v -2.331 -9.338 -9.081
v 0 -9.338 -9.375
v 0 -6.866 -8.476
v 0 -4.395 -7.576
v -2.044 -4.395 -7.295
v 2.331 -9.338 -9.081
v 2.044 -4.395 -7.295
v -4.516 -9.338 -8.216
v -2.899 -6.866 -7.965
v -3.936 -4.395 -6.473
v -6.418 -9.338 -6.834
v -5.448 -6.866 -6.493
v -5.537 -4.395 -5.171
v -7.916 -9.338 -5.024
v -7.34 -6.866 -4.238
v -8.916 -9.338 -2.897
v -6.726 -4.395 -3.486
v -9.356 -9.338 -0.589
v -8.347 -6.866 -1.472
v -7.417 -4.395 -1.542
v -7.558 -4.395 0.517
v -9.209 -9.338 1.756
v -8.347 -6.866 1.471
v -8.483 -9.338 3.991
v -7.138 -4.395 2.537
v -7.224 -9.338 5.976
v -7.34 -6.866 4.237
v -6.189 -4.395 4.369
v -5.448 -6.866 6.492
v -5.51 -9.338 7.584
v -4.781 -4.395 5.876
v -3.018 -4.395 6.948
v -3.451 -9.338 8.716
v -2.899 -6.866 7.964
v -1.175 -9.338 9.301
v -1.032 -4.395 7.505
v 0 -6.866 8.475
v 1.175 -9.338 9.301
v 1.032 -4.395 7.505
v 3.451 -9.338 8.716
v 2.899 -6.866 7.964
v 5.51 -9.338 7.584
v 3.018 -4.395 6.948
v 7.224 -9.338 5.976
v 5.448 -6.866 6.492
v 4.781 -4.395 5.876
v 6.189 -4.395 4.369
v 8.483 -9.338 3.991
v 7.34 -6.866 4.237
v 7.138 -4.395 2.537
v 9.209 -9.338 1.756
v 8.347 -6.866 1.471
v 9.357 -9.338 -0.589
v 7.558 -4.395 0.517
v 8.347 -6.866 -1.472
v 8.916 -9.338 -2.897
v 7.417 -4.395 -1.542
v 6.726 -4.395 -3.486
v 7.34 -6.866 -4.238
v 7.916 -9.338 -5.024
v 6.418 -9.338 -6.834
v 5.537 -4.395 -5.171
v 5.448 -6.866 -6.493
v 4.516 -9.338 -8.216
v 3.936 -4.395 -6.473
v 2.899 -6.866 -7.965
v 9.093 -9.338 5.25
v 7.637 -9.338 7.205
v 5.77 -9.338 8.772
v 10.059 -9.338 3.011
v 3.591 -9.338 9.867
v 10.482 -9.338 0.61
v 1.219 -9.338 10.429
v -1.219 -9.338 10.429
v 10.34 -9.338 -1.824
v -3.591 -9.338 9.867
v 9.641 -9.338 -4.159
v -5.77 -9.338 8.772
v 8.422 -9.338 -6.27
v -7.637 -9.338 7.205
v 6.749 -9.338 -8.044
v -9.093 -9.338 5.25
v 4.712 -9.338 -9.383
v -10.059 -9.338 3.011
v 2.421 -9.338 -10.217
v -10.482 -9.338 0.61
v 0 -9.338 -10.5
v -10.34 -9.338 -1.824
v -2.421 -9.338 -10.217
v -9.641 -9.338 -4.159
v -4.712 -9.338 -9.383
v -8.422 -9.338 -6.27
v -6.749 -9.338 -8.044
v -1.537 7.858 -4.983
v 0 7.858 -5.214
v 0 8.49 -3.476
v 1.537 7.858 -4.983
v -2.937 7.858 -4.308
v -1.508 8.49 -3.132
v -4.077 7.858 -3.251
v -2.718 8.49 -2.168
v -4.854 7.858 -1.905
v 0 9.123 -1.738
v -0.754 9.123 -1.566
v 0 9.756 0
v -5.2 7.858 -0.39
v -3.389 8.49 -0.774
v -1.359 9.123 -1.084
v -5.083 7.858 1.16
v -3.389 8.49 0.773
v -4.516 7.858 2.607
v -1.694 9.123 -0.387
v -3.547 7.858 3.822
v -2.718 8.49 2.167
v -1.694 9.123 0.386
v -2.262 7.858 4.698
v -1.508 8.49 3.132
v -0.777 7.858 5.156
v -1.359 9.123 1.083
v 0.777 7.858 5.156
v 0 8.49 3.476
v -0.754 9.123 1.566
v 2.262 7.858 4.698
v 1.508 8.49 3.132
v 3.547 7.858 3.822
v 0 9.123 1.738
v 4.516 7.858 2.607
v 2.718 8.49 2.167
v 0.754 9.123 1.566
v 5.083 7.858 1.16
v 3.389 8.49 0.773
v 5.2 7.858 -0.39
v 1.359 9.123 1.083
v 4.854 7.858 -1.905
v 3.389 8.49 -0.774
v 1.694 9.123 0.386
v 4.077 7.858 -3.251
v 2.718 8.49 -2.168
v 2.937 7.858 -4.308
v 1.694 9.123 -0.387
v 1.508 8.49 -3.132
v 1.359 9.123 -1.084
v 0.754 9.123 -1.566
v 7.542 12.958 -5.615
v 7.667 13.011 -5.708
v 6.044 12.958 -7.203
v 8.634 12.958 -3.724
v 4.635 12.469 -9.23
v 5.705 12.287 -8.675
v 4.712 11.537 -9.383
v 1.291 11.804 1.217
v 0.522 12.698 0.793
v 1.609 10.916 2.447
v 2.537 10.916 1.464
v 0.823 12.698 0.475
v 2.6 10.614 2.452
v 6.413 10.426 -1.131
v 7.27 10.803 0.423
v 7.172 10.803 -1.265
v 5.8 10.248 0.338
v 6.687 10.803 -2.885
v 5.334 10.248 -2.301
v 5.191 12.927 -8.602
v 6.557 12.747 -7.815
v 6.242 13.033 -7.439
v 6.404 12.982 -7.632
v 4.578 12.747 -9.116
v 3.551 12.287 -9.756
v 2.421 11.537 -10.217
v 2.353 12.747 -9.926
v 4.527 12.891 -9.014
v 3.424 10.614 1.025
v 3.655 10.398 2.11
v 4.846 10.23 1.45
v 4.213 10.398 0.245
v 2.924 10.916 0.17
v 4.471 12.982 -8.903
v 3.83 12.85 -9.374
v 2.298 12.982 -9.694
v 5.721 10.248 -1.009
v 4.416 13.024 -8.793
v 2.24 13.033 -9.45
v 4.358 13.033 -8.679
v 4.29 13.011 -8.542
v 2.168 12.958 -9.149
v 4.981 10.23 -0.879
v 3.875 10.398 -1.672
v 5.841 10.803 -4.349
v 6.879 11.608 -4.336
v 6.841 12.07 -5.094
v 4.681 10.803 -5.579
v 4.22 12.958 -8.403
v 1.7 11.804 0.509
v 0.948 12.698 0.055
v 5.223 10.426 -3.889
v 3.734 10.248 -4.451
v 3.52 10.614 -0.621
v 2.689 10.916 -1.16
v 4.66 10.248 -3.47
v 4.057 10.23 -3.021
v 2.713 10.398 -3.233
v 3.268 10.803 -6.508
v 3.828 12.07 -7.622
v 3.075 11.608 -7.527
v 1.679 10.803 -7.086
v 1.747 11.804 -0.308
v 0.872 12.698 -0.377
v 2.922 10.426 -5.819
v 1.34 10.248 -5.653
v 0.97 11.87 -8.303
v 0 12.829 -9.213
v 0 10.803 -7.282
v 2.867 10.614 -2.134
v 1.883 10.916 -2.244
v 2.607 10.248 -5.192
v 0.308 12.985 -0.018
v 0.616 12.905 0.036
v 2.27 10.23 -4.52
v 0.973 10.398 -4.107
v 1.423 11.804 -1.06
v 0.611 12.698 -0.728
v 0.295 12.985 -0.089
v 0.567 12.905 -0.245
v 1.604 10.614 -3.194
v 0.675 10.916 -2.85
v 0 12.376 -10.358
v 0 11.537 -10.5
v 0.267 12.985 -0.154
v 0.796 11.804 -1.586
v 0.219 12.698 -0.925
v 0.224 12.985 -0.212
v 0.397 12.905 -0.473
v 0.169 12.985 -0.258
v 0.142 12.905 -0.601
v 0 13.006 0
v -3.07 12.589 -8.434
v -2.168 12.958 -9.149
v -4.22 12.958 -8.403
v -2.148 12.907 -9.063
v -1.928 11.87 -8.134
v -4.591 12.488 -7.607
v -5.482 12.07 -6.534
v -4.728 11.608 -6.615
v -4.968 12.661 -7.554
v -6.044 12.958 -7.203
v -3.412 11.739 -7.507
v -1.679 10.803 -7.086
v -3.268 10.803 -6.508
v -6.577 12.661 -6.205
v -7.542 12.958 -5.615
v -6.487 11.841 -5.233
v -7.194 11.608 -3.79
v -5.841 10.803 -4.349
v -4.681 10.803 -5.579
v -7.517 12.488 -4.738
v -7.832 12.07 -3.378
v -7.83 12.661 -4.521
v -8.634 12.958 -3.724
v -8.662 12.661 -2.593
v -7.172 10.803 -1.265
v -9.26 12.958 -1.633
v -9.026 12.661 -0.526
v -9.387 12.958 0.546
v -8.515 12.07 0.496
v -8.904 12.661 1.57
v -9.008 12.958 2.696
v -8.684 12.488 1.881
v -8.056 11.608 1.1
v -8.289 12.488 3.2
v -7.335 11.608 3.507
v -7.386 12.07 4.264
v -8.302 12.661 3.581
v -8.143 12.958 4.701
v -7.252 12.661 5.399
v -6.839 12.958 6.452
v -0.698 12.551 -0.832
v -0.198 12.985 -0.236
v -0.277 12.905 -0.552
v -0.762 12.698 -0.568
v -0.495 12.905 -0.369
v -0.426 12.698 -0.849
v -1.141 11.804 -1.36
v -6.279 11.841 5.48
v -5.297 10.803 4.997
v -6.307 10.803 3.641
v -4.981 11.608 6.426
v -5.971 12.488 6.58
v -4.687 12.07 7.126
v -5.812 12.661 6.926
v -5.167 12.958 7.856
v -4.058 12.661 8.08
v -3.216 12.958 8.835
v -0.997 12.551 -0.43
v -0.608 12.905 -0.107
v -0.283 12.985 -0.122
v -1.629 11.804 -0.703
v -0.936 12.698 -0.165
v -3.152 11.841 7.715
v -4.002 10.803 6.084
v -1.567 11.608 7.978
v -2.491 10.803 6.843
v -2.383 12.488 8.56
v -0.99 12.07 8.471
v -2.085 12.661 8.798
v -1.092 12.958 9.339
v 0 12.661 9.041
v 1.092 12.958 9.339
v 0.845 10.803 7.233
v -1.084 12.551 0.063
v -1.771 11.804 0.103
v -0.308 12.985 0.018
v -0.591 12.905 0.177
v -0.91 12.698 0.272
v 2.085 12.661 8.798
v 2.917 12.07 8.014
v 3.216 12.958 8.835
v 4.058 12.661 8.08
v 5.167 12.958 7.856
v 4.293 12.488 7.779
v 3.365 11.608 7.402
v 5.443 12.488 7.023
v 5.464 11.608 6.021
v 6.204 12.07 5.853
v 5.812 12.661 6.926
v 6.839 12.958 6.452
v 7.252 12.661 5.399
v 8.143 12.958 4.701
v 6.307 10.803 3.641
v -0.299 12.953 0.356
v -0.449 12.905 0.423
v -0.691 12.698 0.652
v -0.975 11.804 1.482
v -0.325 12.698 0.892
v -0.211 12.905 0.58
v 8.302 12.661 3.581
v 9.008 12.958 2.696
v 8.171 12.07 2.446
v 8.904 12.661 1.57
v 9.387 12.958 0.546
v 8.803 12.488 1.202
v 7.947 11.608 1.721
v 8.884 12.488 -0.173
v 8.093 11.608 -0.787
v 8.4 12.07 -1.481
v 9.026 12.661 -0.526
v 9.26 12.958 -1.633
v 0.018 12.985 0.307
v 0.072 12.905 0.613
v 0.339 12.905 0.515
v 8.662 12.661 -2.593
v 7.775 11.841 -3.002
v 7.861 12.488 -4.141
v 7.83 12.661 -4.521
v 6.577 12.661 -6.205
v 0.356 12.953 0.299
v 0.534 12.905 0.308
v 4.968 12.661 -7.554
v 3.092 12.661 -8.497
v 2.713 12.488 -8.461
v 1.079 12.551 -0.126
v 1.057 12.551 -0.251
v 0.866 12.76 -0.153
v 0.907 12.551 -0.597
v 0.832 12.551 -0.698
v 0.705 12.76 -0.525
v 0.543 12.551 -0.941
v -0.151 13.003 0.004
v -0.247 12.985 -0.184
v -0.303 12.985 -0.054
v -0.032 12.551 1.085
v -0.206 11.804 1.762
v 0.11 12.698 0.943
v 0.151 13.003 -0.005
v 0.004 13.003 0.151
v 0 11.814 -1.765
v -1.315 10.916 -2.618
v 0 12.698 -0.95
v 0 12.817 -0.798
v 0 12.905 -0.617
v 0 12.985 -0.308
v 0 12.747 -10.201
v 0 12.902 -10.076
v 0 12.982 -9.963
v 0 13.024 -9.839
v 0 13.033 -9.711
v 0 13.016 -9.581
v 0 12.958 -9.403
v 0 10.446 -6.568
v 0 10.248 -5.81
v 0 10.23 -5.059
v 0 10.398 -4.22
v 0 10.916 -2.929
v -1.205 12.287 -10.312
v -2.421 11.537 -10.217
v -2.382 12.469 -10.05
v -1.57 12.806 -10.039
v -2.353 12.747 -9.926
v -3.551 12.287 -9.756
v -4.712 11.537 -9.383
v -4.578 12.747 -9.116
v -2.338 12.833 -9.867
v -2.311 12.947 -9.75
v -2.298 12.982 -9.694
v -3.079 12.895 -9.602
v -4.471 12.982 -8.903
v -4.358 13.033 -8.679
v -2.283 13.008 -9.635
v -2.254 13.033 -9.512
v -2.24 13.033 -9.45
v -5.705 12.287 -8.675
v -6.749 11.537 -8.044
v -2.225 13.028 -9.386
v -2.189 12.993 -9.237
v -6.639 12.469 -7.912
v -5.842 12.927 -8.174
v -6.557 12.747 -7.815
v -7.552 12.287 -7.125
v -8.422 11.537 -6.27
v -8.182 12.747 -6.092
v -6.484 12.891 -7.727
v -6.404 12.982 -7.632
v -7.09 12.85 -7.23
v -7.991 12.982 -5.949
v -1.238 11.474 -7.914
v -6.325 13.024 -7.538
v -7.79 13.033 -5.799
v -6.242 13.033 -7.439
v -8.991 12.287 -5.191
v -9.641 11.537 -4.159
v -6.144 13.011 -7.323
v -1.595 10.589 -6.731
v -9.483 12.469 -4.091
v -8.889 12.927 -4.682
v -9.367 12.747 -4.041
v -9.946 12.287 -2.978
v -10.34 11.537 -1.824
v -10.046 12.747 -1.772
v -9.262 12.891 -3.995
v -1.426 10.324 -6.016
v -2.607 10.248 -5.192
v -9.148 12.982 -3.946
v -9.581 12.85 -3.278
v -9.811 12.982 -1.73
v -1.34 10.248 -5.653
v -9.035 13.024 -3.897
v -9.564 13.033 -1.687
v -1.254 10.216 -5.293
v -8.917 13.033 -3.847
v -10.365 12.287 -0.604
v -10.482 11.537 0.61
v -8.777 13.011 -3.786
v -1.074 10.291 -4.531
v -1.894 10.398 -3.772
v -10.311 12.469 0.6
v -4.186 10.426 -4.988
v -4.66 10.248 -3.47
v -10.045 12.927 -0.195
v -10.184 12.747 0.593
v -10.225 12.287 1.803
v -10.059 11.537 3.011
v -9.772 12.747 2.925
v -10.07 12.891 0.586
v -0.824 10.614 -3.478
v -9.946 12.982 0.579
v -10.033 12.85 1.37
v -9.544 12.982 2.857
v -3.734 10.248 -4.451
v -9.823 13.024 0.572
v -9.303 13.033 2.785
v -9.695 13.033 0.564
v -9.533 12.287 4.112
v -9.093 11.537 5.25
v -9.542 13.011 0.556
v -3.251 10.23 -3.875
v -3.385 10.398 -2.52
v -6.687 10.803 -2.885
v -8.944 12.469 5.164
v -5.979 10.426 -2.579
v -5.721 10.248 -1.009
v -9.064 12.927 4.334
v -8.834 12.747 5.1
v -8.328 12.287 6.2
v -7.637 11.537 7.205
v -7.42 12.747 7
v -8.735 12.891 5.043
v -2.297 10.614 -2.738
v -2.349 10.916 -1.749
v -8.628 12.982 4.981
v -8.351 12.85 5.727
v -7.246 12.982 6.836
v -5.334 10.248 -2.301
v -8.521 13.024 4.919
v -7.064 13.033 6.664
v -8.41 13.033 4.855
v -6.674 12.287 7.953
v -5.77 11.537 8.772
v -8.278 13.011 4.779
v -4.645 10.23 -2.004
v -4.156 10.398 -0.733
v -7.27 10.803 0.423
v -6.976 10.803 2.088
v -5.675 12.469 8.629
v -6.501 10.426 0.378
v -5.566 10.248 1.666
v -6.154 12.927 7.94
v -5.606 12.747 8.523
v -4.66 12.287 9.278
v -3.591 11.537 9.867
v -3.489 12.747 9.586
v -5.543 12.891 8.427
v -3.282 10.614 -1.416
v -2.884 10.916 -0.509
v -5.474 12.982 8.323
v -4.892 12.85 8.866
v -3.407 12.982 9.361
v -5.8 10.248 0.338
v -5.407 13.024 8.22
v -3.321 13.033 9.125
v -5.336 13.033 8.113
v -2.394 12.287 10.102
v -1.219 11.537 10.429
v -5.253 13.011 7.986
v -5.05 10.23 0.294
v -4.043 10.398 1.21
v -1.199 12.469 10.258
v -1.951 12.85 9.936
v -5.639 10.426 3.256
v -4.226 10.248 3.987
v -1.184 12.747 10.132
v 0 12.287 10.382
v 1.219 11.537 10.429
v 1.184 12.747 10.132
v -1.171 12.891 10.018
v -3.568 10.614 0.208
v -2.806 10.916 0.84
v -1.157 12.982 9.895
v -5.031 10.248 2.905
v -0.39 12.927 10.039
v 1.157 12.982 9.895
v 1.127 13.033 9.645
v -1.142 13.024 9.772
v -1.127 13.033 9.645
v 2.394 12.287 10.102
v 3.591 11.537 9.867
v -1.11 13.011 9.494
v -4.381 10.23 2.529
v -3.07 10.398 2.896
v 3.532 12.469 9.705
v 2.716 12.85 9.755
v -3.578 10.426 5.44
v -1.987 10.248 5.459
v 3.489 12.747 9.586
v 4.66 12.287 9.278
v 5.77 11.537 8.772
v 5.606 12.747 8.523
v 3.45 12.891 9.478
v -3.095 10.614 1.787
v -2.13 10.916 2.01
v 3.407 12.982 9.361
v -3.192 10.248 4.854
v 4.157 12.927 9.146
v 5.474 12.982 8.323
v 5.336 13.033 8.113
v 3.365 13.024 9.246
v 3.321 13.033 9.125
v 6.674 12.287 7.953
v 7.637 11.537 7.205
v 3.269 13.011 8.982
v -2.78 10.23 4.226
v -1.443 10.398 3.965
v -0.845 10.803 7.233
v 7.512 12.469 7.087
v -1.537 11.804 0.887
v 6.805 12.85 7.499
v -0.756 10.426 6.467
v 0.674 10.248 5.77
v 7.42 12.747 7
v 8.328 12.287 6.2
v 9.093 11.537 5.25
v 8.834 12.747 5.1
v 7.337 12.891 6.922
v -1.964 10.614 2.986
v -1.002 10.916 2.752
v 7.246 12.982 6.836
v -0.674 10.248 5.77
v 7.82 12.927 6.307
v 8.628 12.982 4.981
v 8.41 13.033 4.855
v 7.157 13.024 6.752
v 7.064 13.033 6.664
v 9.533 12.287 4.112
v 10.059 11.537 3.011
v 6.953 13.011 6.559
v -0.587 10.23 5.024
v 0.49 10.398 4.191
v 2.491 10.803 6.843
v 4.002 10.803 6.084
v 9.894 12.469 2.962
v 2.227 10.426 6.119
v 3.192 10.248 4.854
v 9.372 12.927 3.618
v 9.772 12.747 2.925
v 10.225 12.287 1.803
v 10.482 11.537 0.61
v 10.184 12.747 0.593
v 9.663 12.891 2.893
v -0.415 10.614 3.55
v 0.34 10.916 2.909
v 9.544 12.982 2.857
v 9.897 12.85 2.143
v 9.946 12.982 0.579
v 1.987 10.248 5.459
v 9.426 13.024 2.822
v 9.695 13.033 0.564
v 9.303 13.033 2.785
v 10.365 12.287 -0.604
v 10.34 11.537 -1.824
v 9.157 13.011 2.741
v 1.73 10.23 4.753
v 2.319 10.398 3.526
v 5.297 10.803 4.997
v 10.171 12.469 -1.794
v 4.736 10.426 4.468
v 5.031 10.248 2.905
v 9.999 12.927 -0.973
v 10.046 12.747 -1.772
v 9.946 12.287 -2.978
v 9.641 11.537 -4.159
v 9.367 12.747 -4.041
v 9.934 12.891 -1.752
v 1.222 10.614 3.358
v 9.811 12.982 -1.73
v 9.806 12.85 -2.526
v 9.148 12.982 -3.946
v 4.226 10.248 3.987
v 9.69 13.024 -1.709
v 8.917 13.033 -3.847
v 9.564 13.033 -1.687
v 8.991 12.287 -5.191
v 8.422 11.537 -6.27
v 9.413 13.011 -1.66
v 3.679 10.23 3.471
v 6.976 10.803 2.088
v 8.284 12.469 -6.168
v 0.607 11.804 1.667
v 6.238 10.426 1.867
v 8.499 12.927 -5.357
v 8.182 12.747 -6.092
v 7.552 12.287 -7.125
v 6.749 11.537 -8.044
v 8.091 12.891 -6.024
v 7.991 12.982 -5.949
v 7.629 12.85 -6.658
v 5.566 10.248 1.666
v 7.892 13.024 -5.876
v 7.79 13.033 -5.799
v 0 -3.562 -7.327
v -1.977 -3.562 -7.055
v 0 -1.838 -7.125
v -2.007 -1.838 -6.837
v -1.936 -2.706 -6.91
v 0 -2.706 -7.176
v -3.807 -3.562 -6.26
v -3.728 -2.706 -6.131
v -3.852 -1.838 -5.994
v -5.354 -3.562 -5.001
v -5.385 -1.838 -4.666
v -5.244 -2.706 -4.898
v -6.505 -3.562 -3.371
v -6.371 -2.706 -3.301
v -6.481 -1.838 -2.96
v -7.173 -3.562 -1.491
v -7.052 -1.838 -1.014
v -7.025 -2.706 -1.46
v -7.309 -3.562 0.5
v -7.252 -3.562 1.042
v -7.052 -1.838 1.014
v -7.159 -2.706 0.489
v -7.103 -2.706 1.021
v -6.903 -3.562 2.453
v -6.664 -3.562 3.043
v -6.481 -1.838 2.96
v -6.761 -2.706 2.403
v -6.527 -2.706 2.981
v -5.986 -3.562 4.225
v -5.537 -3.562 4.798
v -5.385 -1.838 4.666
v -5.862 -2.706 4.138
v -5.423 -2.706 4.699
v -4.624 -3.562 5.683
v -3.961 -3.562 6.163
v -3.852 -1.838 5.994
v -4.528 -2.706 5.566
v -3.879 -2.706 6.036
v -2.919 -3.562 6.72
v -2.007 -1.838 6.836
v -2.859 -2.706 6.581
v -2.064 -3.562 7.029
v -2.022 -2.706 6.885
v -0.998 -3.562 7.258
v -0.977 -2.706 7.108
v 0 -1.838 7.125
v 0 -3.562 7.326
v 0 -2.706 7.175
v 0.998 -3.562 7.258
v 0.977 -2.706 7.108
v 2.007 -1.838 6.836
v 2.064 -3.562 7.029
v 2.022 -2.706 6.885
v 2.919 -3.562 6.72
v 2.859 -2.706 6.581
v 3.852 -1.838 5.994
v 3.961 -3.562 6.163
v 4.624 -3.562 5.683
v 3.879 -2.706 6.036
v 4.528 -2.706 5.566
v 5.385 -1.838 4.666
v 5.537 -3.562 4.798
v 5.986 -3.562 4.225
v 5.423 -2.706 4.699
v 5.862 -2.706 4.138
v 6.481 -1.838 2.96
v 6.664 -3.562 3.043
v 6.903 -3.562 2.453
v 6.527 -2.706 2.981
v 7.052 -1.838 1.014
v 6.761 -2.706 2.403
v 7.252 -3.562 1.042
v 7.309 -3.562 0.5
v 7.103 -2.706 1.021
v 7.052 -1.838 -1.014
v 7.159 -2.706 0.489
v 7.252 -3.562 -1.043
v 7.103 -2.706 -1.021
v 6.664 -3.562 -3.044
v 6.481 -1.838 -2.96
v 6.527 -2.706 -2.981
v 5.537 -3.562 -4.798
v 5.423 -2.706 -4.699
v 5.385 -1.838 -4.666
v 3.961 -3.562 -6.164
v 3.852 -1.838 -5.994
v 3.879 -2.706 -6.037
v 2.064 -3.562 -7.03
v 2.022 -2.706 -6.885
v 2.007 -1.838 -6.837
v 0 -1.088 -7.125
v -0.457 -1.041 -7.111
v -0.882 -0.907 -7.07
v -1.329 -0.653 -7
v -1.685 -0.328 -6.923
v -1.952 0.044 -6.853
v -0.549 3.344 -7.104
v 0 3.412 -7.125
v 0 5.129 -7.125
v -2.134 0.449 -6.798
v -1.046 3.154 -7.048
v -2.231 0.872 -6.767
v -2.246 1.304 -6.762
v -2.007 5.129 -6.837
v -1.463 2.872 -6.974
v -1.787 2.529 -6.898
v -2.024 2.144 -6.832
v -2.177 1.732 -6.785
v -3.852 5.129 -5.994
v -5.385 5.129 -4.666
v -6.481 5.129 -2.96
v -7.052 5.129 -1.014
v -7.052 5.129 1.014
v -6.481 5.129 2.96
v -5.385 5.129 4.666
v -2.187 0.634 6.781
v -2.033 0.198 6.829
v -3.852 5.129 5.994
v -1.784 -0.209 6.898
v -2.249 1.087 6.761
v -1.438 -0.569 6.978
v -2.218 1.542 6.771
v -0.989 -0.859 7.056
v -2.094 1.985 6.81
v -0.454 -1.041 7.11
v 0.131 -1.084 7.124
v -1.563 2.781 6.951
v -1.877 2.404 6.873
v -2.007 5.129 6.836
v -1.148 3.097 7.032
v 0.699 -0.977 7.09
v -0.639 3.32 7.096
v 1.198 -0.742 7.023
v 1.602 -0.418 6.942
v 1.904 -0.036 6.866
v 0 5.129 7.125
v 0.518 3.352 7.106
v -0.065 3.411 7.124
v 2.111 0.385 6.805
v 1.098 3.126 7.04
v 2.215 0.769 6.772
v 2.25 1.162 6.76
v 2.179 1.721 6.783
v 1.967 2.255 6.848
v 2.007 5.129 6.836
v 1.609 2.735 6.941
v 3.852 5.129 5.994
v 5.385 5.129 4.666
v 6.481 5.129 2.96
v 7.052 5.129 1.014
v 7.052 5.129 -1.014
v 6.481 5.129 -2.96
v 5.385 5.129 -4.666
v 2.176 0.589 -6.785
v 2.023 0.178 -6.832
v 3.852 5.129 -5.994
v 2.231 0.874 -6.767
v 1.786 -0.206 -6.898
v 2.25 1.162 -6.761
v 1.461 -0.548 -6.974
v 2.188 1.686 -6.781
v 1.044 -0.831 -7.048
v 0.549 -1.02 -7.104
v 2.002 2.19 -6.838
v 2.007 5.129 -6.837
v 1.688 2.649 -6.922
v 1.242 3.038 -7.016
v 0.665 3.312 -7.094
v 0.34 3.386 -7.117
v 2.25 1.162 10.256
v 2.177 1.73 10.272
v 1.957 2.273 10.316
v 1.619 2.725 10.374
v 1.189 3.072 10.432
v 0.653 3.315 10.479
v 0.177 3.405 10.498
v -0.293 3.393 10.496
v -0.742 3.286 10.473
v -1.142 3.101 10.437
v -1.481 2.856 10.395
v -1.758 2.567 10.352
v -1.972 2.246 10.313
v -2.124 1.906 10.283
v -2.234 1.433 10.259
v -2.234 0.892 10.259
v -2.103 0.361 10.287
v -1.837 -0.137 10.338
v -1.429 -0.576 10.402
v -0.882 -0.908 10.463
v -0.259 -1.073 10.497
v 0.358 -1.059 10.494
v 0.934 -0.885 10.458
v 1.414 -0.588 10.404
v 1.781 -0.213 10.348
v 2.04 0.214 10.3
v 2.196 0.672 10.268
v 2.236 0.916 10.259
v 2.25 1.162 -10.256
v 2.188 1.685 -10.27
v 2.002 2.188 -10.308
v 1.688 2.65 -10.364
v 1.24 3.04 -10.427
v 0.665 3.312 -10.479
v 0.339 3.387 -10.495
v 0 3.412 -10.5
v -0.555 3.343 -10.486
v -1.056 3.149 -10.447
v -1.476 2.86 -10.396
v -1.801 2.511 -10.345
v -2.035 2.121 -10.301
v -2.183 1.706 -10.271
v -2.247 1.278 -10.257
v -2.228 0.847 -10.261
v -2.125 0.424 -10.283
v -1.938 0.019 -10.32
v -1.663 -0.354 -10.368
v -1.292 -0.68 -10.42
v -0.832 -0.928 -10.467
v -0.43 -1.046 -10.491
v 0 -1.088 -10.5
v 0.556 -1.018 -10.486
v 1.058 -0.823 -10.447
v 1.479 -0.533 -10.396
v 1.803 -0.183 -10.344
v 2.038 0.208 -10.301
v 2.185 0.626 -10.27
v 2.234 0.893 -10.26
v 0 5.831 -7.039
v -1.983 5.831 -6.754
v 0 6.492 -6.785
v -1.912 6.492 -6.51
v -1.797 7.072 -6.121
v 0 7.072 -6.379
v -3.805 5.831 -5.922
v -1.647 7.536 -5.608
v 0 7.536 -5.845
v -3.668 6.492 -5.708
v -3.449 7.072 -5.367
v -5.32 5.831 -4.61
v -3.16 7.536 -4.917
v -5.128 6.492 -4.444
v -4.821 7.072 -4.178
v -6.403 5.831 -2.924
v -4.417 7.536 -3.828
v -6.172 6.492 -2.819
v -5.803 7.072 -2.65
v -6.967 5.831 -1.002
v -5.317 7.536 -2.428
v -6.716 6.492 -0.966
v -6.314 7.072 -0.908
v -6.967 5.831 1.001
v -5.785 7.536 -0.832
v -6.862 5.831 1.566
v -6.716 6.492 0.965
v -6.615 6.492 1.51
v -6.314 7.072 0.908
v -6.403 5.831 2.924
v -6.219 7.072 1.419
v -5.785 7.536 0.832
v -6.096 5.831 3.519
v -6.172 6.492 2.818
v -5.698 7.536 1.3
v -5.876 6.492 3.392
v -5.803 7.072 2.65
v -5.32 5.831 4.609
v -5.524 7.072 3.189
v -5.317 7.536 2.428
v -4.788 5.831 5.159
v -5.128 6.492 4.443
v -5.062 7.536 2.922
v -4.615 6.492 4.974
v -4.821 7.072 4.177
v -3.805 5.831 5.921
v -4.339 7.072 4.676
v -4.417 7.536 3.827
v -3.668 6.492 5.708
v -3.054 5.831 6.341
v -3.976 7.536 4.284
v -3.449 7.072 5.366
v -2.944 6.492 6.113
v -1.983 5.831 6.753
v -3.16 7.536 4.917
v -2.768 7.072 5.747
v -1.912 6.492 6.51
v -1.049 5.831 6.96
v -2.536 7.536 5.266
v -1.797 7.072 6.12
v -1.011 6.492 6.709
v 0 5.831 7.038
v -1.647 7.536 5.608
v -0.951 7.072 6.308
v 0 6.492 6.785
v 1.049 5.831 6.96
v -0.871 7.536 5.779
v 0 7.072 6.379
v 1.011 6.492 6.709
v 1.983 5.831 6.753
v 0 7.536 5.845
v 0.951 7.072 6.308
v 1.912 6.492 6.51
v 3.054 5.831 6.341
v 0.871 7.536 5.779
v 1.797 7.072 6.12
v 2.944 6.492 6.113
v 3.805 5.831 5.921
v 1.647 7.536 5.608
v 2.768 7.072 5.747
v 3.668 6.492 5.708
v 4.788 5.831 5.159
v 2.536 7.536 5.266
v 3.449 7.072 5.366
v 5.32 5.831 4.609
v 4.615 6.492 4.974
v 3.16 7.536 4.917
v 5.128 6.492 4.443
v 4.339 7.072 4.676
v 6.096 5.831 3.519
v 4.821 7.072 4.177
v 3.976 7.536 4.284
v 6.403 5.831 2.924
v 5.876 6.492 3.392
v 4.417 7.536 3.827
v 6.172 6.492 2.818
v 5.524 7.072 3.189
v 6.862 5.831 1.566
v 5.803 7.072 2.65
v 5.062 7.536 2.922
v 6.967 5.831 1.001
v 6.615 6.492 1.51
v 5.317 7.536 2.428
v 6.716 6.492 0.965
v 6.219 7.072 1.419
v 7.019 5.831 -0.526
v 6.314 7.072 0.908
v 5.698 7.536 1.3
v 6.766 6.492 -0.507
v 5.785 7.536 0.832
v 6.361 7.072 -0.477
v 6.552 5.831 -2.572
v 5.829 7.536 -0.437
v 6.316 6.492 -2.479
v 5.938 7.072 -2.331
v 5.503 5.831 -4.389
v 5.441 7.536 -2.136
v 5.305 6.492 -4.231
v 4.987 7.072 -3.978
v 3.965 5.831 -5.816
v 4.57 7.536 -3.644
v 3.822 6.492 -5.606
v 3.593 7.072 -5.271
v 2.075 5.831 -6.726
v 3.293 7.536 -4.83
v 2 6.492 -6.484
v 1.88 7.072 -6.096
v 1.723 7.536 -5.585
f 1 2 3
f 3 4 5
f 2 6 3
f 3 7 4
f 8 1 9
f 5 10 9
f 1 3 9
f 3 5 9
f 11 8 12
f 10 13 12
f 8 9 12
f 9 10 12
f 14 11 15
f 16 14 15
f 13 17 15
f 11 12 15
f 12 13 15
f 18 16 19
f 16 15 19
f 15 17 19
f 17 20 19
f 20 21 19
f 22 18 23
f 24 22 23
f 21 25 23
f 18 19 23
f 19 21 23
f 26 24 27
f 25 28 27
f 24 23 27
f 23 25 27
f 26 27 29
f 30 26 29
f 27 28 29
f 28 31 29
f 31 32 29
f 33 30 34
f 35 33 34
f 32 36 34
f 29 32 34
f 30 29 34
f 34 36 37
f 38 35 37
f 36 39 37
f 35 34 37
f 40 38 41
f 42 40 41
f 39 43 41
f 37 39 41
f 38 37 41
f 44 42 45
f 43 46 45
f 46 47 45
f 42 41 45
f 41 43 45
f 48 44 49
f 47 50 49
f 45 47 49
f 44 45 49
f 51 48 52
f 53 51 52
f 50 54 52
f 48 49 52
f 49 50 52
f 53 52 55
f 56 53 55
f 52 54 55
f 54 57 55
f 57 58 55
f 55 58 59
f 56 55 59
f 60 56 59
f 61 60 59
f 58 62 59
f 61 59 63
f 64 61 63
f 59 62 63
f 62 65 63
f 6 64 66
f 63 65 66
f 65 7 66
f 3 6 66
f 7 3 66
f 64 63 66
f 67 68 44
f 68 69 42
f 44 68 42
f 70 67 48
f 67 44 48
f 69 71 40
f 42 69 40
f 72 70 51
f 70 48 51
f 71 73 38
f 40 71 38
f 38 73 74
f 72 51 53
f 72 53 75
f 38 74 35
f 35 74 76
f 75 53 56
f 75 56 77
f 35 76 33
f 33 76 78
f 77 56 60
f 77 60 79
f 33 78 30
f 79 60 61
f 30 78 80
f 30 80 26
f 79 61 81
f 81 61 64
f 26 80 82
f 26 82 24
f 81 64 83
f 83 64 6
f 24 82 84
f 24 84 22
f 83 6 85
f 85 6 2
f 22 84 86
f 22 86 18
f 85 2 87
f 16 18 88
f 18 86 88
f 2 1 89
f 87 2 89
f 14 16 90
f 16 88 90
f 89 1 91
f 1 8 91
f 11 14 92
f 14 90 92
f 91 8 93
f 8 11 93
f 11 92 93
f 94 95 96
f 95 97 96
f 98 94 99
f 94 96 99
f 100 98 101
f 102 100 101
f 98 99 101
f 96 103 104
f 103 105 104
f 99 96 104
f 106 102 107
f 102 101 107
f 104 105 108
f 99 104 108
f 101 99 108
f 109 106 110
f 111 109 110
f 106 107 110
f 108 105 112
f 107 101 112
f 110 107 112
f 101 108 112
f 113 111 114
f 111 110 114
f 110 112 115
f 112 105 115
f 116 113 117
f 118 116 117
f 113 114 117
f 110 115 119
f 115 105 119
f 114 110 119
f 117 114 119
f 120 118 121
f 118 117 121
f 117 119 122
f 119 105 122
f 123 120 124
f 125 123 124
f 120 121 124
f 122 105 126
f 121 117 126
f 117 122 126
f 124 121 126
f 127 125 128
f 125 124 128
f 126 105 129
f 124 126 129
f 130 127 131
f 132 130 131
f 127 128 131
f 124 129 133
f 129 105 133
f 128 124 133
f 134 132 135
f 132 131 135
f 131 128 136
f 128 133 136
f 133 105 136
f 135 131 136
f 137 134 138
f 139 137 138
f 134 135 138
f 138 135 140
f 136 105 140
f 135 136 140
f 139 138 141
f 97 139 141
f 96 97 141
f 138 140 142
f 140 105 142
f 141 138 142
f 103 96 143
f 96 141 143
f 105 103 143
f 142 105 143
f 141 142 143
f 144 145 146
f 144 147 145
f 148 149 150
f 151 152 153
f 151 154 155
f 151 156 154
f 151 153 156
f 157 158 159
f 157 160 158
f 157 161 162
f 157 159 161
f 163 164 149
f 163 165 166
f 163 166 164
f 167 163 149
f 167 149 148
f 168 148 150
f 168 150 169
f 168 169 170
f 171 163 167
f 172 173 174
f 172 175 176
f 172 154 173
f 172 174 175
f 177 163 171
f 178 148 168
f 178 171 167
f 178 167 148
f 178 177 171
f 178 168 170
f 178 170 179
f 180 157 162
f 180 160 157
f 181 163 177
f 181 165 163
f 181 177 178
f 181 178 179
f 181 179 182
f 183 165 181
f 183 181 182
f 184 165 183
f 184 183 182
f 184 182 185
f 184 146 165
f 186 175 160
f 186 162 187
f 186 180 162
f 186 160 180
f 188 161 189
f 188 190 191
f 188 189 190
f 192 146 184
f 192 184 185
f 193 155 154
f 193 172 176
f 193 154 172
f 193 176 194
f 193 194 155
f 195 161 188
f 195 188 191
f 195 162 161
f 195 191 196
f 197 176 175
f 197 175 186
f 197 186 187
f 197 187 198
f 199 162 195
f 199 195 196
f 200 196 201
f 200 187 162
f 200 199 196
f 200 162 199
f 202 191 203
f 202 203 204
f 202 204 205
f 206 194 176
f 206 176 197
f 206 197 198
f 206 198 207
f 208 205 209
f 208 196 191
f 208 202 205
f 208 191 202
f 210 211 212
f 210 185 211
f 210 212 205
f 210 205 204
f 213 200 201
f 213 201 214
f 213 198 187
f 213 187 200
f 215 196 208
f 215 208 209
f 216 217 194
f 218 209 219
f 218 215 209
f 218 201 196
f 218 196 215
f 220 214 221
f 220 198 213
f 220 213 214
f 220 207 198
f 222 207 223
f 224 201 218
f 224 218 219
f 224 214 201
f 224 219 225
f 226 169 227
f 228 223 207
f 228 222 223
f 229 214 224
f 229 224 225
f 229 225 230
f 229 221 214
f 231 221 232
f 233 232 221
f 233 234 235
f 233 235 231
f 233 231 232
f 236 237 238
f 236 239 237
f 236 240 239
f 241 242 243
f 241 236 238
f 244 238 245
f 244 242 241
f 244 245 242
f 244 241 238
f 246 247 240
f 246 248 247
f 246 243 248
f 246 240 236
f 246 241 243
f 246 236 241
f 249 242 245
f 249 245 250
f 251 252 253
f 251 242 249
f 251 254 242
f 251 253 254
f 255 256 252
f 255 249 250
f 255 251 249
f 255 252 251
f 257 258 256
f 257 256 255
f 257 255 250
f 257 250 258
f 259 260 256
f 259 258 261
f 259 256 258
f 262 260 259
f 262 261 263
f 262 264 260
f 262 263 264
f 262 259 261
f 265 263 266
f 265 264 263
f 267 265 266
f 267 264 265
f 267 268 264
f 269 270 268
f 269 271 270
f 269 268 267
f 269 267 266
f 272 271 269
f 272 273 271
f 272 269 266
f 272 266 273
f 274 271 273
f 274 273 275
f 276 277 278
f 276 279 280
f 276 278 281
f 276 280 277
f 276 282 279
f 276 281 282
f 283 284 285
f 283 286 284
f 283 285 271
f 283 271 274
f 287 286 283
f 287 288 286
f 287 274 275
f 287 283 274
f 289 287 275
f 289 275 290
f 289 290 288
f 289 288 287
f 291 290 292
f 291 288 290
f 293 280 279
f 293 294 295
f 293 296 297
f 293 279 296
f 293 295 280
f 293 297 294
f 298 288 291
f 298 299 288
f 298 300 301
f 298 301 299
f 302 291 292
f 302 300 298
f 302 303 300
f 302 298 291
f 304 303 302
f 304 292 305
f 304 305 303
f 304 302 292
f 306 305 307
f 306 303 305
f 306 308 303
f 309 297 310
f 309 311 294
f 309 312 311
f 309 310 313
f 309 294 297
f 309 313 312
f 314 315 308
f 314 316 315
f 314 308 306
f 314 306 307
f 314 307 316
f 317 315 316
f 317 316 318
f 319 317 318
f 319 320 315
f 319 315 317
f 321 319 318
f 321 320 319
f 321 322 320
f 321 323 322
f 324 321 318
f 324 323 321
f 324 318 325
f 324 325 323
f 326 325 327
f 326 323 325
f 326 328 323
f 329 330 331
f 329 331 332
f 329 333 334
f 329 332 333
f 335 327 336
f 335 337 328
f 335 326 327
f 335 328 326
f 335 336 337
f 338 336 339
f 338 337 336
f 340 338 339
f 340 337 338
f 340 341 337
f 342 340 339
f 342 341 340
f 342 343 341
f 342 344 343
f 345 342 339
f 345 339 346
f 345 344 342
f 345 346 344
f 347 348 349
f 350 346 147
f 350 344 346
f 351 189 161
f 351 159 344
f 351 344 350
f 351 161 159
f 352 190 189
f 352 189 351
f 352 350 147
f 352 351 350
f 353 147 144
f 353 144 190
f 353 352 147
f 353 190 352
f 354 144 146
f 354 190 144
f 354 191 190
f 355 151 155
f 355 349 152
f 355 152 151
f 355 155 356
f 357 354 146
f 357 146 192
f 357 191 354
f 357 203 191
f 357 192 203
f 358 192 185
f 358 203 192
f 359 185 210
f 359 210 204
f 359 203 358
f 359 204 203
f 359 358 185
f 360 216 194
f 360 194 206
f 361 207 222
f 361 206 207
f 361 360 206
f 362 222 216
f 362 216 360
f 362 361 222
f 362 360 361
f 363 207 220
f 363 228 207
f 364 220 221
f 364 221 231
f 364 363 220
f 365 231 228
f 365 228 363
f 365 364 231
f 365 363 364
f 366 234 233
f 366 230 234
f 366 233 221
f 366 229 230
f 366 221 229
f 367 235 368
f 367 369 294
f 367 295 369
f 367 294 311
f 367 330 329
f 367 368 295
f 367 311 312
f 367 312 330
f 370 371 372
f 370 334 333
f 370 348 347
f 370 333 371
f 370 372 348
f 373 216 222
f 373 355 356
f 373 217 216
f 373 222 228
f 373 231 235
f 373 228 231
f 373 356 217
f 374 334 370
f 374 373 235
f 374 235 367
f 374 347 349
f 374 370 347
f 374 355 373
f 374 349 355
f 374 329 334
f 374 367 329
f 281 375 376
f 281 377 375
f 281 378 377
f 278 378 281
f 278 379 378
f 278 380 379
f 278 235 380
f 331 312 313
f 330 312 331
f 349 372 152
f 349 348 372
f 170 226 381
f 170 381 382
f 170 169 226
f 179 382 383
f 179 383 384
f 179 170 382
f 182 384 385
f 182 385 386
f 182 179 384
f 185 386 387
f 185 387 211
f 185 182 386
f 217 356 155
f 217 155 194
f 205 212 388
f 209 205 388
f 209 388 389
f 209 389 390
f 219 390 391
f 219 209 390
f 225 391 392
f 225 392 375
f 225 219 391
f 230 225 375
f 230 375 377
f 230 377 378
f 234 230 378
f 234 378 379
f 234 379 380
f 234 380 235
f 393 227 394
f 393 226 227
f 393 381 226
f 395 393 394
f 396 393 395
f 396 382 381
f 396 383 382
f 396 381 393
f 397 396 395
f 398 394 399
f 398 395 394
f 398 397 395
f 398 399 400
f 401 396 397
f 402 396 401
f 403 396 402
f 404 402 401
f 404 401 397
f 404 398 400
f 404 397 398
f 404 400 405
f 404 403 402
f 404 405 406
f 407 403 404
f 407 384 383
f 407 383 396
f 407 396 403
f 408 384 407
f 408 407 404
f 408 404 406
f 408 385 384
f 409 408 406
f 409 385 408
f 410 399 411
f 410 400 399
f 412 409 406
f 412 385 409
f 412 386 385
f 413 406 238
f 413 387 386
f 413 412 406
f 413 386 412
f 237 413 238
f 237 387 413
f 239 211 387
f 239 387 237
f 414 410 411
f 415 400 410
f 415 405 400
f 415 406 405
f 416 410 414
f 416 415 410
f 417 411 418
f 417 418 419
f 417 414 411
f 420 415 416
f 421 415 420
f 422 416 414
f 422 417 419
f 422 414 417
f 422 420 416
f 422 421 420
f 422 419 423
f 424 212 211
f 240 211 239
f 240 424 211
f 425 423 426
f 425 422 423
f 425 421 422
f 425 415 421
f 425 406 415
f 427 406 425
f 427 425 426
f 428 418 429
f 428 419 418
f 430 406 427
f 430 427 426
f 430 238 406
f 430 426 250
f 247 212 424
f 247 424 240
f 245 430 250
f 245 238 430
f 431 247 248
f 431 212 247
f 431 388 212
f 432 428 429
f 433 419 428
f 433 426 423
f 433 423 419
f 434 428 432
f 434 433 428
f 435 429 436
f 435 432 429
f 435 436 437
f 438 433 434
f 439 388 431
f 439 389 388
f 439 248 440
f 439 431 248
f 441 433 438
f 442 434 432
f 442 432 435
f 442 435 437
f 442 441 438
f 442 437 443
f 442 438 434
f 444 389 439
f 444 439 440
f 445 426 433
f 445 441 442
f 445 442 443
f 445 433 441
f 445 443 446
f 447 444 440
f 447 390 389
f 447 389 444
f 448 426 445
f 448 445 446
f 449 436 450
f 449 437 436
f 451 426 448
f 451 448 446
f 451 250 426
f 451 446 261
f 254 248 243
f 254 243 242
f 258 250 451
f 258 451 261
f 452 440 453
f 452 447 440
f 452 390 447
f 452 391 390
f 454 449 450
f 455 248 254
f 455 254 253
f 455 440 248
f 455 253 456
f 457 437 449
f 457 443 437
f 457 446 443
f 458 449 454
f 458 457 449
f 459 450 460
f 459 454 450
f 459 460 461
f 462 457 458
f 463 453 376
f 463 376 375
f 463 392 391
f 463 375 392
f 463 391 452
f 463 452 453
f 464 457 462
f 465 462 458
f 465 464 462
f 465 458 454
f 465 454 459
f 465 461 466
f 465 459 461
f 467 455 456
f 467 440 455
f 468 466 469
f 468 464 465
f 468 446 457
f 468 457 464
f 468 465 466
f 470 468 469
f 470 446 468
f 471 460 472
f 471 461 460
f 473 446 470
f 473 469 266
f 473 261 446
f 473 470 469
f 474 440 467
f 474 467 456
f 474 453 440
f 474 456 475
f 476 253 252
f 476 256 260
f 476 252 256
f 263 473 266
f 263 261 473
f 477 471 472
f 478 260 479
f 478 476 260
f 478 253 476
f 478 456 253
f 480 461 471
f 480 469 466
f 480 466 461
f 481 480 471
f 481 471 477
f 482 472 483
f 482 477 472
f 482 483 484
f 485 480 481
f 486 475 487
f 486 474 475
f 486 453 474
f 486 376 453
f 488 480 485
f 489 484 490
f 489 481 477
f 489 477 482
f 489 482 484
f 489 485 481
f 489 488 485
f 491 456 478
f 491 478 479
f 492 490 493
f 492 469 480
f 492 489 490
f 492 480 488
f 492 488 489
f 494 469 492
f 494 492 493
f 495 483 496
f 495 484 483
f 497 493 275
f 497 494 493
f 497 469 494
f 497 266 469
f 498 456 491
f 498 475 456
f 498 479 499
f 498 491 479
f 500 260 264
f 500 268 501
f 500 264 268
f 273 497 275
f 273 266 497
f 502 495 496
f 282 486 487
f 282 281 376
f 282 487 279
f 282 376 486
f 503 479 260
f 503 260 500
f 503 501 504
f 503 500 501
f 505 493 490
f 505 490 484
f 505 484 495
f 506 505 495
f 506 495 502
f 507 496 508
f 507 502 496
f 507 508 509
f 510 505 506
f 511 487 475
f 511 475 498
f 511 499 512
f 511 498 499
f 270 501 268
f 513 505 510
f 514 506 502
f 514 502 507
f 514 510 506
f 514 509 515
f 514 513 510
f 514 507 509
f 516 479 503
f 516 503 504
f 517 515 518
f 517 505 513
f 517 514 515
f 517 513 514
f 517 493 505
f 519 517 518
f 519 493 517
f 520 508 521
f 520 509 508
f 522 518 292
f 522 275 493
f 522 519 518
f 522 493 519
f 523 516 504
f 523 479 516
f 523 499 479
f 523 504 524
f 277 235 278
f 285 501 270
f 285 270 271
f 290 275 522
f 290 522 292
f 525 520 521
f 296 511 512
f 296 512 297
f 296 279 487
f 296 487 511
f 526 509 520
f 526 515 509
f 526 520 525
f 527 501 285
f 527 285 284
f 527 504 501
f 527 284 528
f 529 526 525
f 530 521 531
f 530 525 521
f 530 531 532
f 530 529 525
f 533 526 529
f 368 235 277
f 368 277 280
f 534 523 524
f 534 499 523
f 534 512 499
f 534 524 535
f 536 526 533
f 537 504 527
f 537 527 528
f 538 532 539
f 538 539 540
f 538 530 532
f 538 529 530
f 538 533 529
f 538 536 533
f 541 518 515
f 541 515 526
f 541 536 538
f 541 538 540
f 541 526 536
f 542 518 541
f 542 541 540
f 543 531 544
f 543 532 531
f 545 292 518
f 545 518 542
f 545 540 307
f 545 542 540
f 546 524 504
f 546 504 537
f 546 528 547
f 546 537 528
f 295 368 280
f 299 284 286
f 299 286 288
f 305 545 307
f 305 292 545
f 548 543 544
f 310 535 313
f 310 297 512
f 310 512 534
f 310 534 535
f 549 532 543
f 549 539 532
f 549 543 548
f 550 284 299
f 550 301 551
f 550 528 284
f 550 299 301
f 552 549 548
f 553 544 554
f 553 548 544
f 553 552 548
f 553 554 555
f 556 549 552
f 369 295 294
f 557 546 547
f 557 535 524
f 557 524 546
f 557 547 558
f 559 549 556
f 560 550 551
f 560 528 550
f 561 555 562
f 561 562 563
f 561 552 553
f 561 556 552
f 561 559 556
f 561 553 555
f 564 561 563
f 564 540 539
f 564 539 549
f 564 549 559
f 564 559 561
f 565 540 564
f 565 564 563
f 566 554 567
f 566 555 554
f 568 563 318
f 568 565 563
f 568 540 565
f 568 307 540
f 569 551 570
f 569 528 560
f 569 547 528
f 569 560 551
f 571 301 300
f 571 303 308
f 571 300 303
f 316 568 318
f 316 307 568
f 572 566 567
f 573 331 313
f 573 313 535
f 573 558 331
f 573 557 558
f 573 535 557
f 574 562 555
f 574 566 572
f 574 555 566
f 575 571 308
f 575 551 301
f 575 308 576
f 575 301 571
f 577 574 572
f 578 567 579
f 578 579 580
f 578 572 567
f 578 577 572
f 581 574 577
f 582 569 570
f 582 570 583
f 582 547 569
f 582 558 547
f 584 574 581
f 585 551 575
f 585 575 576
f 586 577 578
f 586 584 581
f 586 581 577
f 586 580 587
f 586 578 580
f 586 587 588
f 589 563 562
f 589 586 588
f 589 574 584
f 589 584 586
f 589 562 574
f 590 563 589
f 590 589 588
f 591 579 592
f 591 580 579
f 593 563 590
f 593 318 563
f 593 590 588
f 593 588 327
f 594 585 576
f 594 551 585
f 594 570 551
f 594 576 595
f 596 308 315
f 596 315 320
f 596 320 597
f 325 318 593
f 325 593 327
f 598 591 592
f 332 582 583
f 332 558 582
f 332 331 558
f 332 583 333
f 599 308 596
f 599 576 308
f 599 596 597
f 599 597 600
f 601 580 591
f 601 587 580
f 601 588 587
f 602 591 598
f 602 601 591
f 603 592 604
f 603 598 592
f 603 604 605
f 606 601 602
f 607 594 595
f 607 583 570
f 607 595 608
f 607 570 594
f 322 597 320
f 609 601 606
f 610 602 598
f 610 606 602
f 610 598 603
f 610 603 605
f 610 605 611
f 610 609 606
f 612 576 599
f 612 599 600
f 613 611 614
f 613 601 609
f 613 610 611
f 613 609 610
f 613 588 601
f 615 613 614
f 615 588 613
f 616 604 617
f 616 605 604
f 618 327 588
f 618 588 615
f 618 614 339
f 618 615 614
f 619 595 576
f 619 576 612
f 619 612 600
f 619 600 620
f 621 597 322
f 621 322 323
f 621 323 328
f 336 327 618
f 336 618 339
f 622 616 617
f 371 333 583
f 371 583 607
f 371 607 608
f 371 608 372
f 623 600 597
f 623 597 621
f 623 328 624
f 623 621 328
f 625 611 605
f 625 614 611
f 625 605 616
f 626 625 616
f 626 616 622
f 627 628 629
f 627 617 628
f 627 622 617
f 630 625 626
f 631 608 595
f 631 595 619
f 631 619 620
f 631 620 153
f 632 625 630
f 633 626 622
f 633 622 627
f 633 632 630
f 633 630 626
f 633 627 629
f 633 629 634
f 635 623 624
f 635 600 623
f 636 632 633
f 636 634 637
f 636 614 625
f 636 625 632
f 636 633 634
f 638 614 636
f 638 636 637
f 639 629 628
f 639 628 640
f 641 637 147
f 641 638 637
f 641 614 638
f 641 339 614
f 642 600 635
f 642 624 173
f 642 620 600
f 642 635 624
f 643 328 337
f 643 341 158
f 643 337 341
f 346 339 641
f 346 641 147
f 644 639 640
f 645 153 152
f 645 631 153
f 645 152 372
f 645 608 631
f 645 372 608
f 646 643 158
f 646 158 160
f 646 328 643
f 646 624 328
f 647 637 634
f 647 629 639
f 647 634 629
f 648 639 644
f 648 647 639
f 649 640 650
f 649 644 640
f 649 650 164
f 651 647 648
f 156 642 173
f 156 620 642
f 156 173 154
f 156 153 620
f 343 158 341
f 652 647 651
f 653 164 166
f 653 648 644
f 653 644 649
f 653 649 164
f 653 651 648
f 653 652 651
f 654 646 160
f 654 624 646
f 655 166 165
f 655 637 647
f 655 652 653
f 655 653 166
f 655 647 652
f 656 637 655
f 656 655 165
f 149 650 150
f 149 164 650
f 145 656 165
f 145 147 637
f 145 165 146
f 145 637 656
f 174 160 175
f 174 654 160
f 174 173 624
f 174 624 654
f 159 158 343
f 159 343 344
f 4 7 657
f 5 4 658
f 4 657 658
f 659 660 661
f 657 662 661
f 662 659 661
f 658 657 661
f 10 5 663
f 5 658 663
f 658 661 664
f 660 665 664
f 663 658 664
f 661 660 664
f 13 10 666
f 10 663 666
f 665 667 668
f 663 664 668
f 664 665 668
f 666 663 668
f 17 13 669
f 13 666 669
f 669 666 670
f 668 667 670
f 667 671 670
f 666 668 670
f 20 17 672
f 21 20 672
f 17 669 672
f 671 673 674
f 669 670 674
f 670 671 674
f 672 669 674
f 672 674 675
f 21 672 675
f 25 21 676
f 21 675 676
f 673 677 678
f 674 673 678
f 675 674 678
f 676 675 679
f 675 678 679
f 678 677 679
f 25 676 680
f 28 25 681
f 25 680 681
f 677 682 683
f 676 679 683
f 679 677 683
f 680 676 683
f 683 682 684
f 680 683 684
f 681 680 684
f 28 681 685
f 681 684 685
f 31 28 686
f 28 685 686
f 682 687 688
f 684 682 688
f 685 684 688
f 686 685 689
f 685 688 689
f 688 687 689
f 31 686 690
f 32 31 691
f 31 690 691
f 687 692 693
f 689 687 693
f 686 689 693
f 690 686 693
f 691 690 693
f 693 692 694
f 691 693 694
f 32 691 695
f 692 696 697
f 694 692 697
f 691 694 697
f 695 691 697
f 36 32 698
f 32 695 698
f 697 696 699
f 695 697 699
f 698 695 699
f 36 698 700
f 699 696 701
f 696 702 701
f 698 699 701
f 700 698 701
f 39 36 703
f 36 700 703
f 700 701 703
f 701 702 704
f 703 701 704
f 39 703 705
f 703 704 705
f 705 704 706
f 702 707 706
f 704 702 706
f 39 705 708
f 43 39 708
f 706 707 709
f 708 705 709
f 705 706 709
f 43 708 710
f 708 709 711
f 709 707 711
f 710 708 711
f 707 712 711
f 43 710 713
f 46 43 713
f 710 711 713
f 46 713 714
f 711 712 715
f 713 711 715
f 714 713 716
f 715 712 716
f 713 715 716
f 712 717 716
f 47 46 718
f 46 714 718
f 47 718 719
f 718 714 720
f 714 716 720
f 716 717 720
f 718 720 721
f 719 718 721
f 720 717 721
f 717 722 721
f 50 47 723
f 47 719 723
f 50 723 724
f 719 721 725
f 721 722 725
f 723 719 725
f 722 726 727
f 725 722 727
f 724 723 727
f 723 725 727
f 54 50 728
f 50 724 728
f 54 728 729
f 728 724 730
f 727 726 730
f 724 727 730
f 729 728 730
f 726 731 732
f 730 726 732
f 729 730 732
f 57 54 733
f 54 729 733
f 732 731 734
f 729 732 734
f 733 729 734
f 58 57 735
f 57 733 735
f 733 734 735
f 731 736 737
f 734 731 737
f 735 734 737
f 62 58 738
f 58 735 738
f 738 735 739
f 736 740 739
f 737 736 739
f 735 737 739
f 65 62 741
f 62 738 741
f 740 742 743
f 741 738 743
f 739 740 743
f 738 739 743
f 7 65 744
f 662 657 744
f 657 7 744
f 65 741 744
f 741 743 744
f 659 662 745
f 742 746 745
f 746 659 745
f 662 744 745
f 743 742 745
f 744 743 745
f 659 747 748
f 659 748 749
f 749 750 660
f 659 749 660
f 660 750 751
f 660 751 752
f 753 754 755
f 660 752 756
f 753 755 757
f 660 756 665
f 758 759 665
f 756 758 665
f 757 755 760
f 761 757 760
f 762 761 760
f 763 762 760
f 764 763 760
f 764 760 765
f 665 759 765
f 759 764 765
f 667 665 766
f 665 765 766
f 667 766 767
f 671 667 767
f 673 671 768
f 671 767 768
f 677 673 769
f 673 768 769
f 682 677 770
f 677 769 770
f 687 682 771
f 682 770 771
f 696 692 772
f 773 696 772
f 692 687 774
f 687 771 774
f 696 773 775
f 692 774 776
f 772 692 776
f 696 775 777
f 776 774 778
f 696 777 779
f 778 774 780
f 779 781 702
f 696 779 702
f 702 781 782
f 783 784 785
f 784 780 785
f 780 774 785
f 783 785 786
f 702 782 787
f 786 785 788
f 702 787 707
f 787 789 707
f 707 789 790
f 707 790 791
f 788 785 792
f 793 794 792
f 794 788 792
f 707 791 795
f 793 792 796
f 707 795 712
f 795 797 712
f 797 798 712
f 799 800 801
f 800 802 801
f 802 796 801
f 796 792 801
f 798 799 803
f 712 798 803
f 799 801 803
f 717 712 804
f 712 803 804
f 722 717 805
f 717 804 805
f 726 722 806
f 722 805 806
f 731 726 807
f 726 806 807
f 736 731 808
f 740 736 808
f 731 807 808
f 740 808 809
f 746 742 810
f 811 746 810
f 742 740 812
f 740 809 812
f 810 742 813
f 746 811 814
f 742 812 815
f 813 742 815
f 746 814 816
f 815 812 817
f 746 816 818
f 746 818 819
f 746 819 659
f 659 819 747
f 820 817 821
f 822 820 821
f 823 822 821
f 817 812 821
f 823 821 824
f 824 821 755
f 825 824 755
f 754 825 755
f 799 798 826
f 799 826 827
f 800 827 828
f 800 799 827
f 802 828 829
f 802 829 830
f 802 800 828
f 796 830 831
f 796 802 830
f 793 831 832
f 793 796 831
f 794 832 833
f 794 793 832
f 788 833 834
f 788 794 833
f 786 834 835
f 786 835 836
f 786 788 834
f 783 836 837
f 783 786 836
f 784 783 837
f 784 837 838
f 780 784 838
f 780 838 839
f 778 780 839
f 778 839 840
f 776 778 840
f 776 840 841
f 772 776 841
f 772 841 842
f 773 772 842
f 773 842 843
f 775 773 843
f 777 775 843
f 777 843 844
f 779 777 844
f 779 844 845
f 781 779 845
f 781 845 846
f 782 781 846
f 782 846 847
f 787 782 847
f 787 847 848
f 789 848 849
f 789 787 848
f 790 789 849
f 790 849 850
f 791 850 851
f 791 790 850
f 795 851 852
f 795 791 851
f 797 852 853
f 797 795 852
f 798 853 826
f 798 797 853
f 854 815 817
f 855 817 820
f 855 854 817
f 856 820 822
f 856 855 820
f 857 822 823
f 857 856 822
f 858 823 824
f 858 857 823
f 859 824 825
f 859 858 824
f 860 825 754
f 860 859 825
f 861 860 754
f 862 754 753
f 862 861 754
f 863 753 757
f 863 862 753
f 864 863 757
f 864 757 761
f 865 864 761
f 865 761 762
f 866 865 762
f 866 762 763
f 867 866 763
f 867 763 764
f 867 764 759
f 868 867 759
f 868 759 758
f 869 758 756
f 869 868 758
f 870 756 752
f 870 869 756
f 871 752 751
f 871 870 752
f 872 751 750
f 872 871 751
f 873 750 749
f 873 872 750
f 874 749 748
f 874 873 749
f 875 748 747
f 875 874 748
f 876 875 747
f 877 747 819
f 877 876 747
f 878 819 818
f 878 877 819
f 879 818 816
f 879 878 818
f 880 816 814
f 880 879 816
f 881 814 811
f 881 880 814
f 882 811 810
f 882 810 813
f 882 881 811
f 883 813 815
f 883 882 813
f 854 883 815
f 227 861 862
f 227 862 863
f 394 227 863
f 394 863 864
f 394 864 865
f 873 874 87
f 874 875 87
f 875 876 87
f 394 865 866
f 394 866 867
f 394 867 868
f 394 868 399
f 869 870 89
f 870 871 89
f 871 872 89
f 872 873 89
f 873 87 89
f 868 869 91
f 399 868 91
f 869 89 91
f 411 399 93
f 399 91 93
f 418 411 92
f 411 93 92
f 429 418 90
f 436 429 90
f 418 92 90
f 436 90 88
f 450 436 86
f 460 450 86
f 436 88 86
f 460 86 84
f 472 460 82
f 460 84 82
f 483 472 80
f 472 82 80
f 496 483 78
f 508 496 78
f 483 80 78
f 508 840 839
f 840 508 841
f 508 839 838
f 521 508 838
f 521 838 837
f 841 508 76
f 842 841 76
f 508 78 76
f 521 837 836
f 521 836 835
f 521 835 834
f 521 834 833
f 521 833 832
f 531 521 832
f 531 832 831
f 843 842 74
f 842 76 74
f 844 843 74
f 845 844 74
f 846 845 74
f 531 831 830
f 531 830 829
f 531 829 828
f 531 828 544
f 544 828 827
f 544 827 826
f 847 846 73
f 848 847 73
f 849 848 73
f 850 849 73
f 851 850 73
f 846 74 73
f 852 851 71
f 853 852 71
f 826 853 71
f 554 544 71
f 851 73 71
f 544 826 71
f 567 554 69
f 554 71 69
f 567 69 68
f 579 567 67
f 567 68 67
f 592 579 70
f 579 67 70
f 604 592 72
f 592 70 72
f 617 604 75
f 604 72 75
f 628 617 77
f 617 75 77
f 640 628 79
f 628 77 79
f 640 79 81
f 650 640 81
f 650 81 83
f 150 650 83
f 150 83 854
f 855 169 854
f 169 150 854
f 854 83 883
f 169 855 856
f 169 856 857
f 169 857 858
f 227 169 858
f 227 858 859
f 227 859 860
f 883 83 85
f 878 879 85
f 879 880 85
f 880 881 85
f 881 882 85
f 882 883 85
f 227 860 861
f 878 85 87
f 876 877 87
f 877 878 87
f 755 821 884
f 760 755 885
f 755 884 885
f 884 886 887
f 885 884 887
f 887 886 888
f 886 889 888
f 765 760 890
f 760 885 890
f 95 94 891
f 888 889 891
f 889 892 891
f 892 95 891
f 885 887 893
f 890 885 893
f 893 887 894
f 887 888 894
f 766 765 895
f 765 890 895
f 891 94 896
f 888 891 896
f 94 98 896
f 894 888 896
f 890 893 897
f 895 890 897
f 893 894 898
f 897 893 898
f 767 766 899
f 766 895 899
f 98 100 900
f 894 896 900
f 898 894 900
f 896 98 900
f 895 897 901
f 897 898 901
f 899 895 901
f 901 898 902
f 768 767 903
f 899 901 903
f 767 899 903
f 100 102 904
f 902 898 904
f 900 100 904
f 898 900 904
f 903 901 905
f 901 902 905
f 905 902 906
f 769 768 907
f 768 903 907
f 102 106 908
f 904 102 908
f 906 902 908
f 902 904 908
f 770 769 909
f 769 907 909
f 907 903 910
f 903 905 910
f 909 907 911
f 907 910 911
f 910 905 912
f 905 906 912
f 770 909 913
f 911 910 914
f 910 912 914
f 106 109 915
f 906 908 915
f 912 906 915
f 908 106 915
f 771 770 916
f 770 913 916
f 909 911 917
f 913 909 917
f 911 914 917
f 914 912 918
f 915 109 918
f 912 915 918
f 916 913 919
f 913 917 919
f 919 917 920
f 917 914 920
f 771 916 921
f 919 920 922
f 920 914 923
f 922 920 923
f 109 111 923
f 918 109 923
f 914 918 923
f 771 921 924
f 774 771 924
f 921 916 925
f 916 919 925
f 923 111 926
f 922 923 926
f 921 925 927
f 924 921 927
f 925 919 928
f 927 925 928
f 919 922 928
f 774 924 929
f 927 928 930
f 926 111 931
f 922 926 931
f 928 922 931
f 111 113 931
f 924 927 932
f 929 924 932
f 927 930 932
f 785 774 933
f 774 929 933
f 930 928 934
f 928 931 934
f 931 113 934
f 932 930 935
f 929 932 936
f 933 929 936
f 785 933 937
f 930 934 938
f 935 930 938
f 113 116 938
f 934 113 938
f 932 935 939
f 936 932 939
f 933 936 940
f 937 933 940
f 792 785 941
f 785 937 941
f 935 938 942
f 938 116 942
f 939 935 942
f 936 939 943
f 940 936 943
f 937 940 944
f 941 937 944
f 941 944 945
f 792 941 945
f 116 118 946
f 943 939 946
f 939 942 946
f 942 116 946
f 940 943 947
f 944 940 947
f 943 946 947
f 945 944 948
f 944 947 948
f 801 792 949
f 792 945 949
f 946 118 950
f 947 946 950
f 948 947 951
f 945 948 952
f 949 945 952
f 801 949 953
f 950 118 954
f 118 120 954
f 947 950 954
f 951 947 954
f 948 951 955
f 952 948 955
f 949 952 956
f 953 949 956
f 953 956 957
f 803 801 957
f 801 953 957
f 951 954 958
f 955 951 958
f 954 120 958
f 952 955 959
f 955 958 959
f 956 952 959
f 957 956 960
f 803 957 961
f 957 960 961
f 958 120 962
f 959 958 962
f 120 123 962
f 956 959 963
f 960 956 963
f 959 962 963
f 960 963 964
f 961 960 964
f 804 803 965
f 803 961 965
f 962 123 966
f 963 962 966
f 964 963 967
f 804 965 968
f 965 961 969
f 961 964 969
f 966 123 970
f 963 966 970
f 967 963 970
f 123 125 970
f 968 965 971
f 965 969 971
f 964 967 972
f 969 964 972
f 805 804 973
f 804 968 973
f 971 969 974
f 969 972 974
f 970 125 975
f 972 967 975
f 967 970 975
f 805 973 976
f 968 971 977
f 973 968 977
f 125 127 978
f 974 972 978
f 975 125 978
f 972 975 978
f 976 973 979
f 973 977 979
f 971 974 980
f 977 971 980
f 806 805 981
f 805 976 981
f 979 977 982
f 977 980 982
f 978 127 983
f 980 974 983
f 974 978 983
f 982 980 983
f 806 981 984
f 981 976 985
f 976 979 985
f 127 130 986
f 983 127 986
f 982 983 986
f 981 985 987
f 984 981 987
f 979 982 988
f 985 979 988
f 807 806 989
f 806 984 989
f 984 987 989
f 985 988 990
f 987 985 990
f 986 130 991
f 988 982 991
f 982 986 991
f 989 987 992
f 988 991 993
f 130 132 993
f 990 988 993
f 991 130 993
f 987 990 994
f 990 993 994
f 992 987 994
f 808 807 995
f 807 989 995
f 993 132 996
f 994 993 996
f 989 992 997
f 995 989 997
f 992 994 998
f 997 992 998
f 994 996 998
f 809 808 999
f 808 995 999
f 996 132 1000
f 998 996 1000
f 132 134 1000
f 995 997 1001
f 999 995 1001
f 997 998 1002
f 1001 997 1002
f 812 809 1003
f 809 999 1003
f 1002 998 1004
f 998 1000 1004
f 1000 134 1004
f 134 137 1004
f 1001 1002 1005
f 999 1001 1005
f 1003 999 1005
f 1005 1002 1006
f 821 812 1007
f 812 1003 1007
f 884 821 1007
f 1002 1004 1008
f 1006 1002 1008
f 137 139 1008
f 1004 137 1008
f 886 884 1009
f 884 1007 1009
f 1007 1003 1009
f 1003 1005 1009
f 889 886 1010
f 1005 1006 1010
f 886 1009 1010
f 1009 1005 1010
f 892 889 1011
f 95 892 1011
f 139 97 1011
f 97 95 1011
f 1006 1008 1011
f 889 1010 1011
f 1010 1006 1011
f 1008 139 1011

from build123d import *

# Parameters (mm, degrees)
CUT_EXTRUDE1_DEPTH      = 14.866731381
CUT_EXTRUDE1_DEPTH_BACK = 14.866731381
SKETCH2_R               = 1.5
SCALE1_SCALE            = 1.5


with BuildPart() as part:
    # Sketch1 → Revolve1 (revolve)
    with BuildSketch(Plane.XY, mode=Mode.PRIVATE) as revolve1_sk:
        with BuildLine():
            Line((-7, 8.712098042), (-7, 7.295703465))
            Line((-7, 7.295703465), (-7, 6.795703465))
            Line((-7, 6.795703465), (-7, 6.295703465))
            Line((-7, 6.295703465), (-7, 5.795703465))
            Line((-7, 5.795703465), (-7, -5.204296535))
            Line((-7, -5.204296535), (-6.25, -5.204296535))
            Line((-6.25, -5.204296535), (-5.050561785, -1.908867124))
            ThreePointArc((-5.050561785, -1.908867124), (-4.825715591, -1.069729704), (-4.75, -0.204296535))
            Line((-4.75, -0.204296535), (-4.75, 4.440083994))
            ThreePointArc((-4.75, 4.440083994), (-4.399873792, 5.550542455), (-3.476134386, 6.259352631))
            Line((-3.476134386, 6.259352631), (0, 7.524562078))
            Line((0, 7.524562078), (0, 8.566185983))
            Line((0, 8.566185983), (0, 9.69172121))
            add(Edge.make_bspline(
                [(-7, 8.712098042), (-6.915941705, 9.672888752), (-6.571850582, 9.786532429), (-6.017076444, 9.562037769), (-5.173496459, 8.320355176), (-3.929482137, 7.778040067), (-3.257853738, 7.770566701), (-1.62159895, 8.374478133), (-0.988089519, 9.078164836), (-0.514286955, 9.634062862), (-0.187546651, 9.695286605), (0, 9.69172121)],
                knots=[0, 0, 0, 0, 0.210746943, 0.254088111, 0.413486836, 0.459298403, 0.666392212, 0.714990212, 0.896680404, 0.92745251, 1, 1, 1, 1], degree=3))
        make_face()
    revolve(revolve1_sk.sketch.rotate(Axis((0, 2.420801252, 0), (0, 1, 0)), 270), axis=Axis((0, 2.420801252, 0), (0, 1, 0)))

    # Sketch2 → Cut-Extrude1 (cut, two sides: drawn at the far end of the back side and taken through both)
    with BuildSketch(Plane.XY.offset(-CUT_EXTRUDE1_DEPTH_BACK)):
        with Locations((0, 1.795703465)):
            Circle(SKETCH2_R)
    extrude(amount=CUT_EXTRUDE1_DEPTH + CUT_EXTRUDE1_DEPTH_BACK, mode=Mode.SUBTRACT)


with BuildPart() as part_1:
    # Scale1: scaled about (-7.054e-06, 3.062618866, 0.000522171)
    add(part.part.scale(SCALE1_SCALE).moved(Location((3.527e-06, -1.531309433, -0.000261085))))


solid = part_1.part
